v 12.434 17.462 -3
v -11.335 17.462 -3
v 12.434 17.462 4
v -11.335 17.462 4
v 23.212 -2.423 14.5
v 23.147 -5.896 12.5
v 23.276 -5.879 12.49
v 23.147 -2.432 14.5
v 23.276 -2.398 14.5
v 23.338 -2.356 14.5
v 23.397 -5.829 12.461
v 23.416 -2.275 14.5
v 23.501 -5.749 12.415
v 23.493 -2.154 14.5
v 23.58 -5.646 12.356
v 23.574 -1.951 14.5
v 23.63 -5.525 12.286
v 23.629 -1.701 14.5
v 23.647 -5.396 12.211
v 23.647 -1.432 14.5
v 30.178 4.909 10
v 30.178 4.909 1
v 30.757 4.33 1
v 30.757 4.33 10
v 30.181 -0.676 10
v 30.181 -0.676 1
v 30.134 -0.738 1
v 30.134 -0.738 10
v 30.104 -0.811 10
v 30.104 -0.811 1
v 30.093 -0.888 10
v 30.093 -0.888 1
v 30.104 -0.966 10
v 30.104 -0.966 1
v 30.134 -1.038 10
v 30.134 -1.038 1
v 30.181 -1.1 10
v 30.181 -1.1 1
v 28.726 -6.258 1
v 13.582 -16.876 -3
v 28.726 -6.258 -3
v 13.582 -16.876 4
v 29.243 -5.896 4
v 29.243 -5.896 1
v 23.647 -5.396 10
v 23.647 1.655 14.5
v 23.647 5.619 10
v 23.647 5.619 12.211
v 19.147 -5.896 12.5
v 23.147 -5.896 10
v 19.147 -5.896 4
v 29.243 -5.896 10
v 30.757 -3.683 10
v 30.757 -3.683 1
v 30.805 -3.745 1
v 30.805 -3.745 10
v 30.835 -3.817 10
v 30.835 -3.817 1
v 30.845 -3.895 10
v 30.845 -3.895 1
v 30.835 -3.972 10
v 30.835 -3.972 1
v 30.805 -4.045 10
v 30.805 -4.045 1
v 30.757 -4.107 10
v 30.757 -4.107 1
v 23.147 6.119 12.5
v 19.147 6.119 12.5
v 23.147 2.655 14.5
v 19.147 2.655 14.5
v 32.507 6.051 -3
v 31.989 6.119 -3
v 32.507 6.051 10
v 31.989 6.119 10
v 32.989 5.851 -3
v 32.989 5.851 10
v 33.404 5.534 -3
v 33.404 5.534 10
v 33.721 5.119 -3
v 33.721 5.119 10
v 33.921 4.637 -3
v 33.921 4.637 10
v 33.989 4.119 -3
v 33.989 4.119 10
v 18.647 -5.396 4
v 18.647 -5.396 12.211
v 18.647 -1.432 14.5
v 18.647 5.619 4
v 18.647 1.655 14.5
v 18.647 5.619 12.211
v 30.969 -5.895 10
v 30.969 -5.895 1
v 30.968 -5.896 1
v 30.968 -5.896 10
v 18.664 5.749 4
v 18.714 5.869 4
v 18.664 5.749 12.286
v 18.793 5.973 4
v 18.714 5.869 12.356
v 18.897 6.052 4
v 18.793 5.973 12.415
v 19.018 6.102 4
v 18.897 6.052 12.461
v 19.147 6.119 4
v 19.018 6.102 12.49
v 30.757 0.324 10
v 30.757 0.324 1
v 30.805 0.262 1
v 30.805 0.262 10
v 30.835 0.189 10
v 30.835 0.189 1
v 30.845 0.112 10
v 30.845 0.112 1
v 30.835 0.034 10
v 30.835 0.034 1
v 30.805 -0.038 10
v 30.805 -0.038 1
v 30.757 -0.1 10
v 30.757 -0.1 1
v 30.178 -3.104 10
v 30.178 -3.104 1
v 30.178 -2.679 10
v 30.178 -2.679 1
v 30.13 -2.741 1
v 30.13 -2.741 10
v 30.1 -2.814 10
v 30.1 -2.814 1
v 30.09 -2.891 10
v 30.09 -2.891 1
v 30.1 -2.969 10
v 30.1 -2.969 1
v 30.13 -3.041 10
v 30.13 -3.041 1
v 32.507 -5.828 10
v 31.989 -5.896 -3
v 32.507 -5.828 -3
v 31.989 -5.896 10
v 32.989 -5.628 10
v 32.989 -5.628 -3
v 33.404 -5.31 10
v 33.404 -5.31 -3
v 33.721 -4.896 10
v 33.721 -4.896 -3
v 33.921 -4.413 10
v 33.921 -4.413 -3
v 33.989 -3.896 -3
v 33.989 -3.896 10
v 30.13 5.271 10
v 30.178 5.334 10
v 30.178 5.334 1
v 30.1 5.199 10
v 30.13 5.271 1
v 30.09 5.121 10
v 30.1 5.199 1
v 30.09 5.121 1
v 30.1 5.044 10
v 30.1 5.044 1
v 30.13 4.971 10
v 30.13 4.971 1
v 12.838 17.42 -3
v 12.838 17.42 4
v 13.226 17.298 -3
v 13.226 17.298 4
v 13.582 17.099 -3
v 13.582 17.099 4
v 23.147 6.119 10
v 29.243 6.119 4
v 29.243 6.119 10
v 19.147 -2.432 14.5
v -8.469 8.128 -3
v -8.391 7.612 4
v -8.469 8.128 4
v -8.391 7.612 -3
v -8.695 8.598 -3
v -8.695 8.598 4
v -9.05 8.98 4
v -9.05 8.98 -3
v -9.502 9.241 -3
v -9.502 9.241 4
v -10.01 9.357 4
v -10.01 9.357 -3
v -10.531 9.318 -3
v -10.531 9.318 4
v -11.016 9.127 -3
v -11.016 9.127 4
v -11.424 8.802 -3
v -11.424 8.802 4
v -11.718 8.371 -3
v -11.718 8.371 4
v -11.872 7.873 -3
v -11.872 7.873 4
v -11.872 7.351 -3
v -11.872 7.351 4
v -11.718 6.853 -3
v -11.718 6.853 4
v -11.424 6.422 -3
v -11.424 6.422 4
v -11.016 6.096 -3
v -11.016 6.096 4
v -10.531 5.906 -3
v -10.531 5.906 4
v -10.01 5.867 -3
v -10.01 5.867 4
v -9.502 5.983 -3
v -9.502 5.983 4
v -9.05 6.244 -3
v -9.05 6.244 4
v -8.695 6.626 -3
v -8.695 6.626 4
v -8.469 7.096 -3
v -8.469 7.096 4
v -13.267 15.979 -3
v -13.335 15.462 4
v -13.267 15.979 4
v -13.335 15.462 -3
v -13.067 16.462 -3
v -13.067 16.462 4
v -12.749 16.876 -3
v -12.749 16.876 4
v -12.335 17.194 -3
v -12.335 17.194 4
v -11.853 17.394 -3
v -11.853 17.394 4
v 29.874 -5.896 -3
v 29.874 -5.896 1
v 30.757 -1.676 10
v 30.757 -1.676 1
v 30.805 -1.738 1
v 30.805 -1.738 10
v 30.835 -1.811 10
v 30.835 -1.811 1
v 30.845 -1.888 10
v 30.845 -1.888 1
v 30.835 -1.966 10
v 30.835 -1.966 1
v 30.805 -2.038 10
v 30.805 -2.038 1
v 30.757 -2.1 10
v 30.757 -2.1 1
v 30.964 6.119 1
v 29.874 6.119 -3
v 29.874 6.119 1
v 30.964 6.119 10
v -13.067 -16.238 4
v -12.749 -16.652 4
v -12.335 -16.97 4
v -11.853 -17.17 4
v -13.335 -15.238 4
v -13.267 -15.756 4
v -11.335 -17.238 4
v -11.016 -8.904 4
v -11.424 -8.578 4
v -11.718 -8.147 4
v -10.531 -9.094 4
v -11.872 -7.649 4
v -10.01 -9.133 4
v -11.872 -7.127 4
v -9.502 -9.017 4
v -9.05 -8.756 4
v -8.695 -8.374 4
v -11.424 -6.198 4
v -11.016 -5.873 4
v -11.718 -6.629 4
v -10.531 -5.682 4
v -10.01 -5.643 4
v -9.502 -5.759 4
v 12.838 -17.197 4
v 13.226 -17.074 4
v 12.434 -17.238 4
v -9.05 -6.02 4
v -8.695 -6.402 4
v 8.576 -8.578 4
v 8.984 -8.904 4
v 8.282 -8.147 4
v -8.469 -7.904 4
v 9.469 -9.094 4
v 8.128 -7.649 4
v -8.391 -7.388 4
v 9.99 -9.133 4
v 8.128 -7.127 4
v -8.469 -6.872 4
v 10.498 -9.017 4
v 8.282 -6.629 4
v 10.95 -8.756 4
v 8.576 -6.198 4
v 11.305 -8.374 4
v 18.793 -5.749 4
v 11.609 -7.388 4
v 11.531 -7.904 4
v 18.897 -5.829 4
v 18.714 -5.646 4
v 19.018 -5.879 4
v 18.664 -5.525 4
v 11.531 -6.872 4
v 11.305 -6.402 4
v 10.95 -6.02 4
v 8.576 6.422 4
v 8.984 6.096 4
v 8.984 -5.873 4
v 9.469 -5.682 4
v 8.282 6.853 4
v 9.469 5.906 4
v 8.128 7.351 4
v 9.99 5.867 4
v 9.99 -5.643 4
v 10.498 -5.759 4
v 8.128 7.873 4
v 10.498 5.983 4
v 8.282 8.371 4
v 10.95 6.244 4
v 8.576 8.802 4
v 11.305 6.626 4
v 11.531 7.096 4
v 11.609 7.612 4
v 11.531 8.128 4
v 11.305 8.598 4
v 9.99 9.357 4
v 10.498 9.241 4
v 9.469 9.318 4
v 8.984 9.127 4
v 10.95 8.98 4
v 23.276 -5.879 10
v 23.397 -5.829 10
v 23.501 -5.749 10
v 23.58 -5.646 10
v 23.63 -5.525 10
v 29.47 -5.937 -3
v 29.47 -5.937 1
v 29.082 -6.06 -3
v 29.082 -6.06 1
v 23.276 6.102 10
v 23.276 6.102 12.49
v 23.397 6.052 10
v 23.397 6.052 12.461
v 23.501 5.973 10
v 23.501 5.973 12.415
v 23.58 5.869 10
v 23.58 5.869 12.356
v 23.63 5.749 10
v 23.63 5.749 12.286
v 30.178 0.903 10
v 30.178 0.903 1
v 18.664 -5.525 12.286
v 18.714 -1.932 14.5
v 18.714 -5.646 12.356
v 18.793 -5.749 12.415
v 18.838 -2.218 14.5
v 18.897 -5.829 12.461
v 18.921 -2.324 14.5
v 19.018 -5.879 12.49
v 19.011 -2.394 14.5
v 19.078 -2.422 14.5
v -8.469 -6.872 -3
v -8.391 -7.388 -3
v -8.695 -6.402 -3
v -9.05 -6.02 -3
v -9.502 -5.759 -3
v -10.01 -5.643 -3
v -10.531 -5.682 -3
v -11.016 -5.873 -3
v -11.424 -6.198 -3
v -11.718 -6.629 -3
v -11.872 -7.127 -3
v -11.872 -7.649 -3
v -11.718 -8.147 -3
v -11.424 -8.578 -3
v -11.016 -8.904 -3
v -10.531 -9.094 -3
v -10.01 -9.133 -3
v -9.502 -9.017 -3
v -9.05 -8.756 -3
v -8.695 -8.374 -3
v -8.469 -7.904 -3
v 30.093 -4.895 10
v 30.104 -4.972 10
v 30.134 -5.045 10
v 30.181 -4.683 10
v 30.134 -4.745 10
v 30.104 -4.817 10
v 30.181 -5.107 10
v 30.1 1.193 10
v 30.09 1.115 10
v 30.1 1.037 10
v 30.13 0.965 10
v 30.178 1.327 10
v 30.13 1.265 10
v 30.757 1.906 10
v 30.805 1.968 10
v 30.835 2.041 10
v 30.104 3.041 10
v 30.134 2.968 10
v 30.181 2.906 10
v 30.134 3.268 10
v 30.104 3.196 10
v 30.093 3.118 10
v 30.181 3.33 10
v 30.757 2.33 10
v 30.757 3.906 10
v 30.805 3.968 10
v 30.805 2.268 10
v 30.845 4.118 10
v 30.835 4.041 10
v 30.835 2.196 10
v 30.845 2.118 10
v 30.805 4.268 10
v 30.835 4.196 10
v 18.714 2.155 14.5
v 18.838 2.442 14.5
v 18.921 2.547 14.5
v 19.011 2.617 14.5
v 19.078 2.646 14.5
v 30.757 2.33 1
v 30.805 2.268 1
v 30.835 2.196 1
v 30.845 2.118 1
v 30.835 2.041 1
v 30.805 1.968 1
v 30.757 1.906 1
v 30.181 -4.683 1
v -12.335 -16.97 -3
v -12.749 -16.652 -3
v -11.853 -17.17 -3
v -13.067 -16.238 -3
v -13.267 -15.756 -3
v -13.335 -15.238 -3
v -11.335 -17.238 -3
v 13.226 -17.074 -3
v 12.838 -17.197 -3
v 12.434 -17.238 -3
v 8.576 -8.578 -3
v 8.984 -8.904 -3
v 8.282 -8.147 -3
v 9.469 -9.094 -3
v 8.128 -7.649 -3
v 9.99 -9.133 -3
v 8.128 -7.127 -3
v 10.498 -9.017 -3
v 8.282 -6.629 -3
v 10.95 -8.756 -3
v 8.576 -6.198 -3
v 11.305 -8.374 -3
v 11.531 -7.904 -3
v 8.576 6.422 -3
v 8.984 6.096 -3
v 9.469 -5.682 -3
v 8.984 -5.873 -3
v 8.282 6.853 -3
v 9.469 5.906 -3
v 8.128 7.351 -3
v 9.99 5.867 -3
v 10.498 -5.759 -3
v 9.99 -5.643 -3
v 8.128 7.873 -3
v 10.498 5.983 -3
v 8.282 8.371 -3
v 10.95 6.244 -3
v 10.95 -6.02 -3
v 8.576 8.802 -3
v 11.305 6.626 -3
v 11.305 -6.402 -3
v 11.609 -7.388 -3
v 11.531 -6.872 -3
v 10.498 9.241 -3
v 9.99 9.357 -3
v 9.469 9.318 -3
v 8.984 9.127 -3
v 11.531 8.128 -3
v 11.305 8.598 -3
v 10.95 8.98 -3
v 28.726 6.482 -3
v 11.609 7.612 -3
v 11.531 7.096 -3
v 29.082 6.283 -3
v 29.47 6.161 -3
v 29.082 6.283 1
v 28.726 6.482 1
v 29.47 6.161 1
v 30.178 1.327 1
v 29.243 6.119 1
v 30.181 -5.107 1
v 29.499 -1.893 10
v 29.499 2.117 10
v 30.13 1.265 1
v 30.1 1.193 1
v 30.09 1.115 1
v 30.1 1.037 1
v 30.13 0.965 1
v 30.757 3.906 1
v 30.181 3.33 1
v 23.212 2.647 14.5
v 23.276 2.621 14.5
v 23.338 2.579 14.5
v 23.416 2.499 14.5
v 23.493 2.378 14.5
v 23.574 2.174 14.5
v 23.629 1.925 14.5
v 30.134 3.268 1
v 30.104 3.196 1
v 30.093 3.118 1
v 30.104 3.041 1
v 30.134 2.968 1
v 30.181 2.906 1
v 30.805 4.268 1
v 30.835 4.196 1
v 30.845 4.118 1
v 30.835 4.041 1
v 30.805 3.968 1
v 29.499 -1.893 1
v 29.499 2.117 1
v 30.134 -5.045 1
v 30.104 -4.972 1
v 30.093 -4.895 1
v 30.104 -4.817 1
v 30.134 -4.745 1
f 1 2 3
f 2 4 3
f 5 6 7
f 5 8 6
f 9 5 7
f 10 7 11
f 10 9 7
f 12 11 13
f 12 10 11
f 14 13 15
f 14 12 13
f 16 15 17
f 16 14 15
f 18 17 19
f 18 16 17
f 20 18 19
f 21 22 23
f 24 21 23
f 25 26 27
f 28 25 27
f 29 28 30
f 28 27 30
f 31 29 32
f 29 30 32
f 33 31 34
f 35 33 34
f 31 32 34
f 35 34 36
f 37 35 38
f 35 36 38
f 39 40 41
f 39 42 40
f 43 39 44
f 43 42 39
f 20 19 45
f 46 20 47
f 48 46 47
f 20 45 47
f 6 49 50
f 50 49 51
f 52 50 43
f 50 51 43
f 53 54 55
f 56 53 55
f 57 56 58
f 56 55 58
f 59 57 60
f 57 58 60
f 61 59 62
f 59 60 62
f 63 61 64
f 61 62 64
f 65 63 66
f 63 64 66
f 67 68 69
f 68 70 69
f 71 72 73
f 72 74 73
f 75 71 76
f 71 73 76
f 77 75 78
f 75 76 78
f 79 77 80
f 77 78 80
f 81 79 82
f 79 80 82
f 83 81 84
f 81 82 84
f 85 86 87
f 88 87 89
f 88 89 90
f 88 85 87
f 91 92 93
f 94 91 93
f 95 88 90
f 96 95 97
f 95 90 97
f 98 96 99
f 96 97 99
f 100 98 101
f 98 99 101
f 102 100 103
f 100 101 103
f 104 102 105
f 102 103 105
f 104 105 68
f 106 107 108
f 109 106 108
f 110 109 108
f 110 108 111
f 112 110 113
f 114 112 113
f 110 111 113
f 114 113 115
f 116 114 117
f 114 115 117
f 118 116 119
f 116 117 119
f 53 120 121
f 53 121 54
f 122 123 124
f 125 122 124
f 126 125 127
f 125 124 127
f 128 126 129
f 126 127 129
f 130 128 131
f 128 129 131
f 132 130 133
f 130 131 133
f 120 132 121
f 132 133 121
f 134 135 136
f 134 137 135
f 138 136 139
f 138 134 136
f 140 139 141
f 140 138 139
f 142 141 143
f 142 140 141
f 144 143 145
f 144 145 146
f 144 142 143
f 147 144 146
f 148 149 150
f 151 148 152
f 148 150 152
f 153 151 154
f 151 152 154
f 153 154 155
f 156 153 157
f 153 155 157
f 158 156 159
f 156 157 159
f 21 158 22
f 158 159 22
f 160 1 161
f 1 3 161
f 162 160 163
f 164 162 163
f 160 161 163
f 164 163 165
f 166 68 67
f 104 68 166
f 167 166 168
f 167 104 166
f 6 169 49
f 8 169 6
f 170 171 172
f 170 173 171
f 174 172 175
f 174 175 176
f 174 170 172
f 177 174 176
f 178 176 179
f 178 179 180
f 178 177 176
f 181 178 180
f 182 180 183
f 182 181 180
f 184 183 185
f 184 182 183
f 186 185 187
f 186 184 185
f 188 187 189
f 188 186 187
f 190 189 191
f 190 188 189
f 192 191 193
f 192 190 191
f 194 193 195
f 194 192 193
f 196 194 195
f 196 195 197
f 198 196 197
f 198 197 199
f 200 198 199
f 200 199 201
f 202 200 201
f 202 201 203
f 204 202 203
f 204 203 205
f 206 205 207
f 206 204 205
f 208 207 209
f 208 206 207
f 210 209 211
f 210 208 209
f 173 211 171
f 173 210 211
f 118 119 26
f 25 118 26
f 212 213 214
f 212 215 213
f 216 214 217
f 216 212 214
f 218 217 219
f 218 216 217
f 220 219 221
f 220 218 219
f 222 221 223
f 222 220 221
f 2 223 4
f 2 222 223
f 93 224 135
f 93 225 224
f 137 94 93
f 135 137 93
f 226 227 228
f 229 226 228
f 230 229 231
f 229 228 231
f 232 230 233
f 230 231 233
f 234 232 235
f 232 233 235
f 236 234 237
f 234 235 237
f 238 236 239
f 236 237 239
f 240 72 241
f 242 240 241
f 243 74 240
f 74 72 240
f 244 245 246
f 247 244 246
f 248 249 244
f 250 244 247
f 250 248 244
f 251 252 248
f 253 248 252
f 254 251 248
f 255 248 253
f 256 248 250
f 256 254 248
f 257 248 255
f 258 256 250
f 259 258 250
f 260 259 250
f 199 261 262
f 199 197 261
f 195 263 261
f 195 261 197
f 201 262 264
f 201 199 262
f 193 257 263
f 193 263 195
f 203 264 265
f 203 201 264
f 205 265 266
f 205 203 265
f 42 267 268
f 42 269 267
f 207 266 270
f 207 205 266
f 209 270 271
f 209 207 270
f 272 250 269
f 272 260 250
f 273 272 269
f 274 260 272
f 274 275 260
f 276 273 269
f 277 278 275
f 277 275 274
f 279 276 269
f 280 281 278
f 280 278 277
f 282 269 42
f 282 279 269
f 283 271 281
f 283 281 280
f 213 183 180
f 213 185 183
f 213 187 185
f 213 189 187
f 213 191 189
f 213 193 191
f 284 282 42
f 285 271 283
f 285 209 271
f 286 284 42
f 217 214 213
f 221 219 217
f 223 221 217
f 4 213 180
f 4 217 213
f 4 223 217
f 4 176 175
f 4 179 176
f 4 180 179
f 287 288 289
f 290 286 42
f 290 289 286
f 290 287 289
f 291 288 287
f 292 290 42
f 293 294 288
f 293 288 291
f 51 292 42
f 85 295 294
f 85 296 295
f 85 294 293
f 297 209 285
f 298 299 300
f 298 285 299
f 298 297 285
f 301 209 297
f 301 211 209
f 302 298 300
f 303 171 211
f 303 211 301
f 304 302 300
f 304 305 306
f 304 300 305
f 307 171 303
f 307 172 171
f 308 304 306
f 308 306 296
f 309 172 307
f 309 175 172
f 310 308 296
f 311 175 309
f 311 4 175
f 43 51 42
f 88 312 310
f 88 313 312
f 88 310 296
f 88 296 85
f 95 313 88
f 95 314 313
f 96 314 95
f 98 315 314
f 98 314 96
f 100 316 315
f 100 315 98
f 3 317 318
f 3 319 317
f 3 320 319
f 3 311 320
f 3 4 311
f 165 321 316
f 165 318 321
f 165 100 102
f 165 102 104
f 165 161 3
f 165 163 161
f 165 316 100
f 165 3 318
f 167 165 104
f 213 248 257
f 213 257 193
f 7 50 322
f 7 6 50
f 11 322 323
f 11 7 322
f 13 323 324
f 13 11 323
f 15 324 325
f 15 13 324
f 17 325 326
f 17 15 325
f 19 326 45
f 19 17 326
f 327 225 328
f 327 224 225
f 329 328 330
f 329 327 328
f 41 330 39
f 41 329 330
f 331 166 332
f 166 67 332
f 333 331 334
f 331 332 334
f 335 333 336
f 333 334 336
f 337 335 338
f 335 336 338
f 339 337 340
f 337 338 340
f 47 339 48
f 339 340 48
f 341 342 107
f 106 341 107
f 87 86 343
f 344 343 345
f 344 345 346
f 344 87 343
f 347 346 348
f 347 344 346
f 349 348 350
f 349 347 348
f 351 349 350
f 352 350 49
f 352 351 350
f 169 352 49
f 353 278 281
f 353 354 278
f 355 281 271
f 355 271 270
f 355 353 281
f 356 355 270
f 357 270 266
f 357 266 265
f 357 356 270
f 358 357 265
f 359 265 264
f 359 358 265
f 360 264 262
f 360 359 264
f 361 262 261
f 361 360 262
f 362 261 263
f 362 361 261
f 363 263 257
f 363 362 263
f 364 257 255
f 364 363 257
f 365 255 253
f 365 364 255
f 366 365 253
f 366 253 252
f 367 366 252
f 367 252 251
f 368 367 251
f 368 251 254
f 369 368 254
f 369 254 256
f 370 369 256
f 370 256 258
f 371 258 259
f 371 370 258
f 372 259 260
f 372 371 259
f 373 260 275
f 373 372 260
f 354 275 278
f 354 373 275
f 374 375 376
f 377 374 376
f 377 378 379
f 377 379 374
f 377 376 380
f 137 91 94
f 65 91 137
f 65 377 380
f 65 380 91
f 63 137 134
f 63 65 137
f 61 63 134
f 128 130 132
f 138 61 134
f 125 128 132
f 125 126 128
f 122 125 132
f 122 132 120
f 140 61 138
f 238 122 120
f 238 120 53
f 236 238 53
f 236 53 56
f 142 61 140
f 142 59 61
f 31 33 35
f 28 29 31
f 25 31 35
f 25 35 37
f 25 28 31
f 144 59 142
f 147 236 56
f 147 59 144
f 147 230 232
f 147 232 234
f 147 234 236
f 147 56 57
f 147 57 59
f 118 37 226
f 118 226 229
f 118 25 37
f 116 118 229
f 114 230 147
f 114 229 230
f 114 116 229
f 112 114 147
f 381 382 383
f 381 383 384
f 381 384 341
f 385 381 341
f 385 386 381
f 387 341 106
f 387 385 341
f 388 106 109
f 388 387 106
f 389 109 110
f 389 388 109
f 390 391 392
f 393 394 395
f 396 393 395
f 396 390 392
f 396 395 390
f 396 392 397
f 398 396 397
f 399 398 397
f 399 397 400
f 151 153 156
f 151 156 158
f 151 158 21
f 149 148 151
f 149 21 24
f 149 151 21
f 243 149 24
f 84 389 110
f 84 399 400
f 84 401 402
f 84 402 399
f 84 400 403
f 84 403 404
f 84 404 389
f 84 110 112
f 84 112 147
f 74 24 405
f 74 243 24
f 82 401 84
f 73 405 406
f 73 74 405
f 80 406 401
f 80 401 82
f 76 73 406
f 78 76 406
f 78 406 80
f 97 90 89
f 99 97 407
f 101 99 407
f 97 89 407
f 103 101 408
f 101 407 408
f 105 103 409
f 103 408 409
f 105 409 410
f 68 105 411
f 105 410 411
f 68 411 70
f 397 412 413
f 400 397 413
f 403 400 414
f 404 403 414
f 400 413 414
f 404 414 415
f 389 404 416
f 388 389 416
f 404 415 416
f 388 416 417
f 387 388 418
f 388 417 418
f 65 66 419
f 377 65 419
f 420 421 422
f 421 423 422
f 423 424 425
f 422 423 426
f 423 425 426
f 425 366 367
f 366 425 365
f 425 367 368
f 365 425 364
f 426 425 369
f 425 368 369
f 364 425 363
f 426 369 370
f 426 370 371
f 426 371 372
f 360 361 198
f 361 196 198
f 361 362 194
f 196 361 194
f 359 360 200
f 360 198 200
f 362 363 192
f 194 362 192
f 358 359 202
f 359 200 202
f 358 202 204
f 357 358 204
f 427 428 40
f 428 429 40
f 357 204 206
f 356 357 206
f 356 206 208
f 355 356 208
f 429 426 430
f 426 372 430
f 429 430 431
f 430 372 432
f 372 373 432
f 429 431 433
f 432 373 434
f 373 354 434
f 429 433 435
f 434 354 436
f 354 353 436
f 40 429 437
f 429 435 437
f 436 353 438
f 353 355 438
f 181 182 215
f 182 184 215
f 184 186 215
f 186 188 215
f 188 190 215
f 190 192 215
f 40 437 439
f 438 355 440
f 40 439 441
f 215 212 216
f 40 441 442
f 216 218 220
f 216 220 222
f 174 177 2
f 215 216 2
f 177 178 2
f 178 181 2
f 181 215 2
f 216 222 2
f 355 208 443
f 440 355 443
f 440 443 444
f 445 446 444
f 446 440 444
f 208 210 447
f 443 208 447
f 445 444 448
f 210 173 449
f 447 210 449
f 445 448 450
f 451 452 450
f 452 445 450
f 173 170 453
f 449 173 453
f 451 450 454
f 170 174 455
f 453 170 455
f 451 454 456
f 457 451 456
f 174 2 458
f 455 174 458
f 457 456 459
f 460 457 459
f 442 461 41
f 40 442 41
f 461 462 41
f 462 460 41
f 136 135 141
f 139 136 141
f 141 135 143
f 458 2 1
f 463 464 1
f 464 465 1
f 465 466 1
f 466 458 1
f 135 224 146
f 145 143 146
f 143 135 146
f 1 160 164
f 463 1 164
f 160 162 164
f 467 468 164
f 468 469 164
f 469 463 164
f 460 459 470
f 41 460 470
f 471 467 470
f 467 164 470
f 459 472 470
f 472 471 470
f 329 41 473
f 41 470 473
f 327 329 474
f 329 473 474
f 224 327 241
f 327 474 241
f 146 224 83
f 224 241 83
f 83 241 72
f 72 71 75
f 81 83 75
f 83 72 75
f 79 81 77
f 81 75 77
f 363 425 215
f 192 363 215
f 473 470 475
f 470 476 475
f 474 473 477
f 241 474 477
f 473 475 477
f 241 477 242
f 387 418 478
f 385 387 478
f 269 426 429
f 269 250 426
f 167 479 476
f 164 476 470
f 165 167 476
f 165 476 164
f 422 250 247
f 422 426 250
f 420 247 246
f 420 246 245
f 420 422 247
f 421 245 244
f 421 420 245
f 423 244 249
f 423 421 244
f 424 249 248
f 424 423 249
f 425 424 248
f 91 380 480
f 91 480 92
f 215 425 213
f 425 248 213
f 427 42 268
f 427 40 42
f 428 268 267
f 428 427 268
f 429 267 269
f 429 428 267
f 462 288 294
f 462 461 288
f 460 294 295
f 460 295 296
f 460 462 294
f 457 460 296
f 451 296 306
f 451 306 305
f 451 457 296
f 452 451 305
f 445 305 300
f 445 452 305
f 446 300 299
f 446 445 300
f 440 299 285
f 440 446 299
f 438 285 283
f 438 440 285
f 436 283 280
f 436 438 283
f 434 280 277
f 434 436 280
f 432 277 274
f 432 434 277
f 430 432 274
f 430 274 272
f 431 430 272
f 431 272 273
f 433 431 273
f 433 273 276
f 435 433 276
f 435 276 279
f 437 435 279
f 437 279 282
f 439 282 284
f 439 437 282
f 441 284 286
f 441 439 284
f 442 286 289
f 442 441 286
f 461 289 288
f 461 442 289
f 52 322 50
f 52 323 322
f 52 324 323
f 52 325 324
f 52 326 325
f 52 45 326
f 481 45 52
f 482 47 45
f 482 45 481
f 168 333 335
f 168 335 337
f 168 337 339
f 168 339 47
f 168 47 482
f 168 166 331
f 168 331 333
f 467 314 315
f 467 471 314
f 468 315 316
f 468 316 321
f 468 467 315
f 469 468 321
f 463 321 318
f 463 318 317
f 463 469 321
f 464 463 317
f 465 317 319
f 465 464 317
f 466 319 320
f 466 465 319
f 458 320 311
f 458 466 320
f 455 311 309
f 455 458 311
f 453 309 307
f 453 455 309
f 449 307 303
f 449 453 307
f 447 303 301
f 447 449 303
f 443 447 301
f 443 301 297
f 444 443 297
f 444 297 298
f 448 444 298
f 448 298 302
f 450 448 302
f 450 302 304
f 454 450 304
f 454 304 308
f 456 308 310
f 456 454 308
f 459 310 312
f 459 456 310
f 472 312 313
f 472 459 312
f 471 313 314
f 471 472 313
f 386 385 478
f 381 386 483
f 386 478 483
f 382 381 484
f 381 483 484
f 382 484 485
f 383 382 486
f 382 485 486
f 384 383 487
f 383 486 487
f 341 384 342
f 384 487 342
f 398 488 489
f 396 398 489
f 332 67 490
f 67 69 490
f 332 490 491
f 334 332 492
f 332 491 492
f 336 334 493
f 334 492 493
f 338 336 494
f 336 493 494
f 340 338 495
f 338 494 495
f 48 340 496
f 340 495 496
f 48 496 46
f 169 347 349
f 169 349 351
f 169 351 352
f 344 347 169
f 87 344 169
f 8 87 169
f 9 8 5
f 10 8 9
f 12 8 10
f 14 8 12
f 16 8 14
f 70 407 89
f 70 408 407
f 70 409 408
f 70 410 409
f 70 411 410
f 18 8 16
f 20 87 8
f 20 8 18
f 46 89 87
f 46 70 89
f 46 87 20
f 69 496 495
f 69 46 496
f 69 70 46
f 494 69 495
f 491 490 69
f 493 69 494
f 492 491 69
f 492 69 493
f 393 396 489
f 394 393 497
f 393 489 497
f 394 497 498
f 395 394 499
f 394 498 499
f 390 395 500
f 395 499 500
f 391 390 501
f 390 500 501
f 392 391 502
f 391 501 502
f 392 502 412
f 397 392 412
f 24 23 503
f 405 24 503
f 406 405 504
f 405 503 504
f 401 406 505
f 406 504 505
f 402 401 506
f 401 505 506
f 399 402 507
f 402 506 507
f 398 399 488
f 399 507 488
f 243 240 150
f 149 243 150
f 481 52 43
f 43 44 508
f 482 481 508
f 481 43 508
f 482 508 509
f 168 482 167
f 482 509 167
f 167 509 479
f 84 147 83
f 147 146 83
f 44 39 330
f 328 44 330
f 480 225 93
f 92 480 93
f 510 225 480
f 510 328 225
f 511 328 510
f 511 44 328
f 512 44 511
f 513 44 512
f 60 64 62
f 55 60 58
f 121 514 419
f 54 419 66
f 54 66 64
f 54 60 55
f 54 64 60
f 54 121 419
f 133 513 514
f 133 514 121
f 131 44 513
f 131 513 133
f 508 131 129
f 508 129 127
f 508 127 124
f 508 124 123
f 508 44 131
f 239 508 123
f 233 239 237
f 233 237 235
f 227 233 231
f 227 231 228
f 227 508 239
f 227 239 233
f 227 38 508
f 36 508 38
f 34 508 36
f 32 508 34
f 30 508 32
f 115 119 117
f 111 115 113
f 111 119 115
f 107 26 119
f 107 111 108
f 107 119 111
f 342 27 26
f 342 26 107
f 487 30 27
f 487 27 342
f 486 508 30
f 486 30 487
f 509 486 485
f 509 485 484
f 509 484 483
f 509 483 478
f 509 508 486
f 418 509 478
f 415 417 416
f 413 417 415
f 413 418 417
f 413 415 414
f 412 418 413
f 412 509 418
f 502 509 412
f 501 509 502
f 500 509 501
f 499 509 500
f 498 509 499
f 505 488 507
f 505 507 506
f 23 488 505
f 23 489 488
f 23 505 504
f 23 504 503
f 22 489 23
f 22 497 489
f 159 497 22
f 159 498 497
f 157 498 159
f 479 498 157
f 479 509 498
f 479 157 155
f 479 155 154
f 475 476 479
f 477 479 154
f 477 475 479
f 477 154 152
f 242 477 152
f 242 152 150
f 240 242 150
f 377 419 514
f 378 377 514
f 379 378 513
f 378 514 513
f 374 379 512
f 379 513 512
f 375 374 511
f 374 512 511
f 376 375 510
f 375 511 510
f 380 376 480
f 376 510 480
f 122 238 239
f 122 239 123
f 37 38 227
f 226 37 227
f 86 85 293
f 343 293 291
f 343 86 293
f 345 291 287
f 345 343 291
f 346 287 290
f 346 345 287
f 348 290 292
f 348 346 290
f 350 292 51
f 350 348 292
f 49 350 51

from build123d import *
from OCP.BRepFilletAPI import BRepFilletAPI_MakeChamfer

# Parameters (mm, degrees)
EXTRUDE_1_DEPTH        = 4
EXTRUDE_1_DEPTH_BACK   = 3
SKETCH_1_R             = 1.75
EXTRUDE_1_2_DEPTH      = 4
EXTRUDE_1_2_DEPTH_BACK = 3
EXTRUDE_START          = 4
EXTRUDE_2_DEPTH        = 6
EXTRUDE_3_DEPTH        = 1
EXTRUDE_3_DEPTH_BACK   = 3
FILLET_1_R             = 2
SKETCH_2_W             = 5
SKETCH_2_H             = 12.015250562
EXTRUDE_4_DEPTH        = 10.5
CHAMFER_2_SIZE         = 2
CHAMFER_2_SIZE2        = 3.464101615
FILLET_2_R             = 0.5


with BuildPart() as part:
    # Эскиз1 → Бобышка-Вытянуть1 (new, two sides: drawn at the far end of the back side and taken through both)
    with BuildSketch(Plane.XY.offset(-EXTRUDE_1_DEPTH_BACK)):
        with BuildLine():
            Line((-13.335192836, 17.461834668), (-13.335192836, -17.238165332))
            Line((-13.335192836, -17.238165332), (13.064807164, -17.238165332))
            Line((13.064807164, -17.238165332), (29.24315013, -5.895849196))
            ThreePointArc((29.24315013, -5.895849196), (29.53124223, 0.111776085), (29.24315013, 6.119401366))
            Line((29.24315013, 6.119401366), (13.064807164, 17.461834668))
            Line((13.064807164, 17.461834668), (-13.335192836, 17.461834668))
        make_face()
        with Locations((-10.14124139, -7.388165332)):
            Circle(SKETCH_1_R, mode=Mode.SUBTRACT)
        with Locations((9.85875861, -7.388165332)):
            Circle(SKETCH_1_R, mode=Mode.SUBTRACT)
        with Locations((-10.14124139, 7.611834668)):
            Circle(SKETCH_1_R, mode=Mode.SUBTRACT)
        with Locations((9.85875861, 7.611834668)):
            Circle(SKETCH_1_R, mode=Mode.SUBTRACT)
    extrude(amount=EXTRUDE_1_DEPTH + EXTRUDE_1_DEPTH_BACK)



with BuildPart() as body_2:
    # Эскиз1 → Extrude 1 2 (new, two sides: drawn at the far end of the back side and taken through both)
    with BuildSketch(Plane.XY.offset(-EXTRUDE_1_2_DEPTH_BACK)):
        with BuildLine():
            Line((30.969143909, -5.894657137), (30.967951851, -5.895849196))
            Line((30.967951851, -5.895849196), (33.989360696, -5.895849196))
            Line((33.989360696, -5.895849196), (33.989360696, 6.119401366))
            Line((33.989360696, 6.119401366), (30.963902746, 6.119401366))
            Line((30.963902746, 6.119401366), (30.178059332, 5.333557953))
            ThreePointArc((30.178059332, 5.333557953), (30.090191367, 5.121425918), (30.178059332, 4.909293884))
            Line((30.178059332, 4.909293884), (30.757011875, 4.330341341))
            ThreePointArc((30.757011875, 4.330341341), (30.84487984, 4.118209307), (30.757011875, 3.906077273))
            Line((30.757011875, 3.906077273), (30.181275944, 3.330341341))
            ThreePointArc((30.181275944, 3.330341341), (30.093407978, 3.118209307), (30.181275944, 2.906077273))
            Line((30.181275944, 2.906077273), (30.757011875, 2.330341341))
            ThreePointArc((30.757011875, 2.330341341), (30.84487984, 2.118209307), (30.757011875, 1.906077273))
            Line((30.757011875, 1.906077273), (30.178059332, 1.32712473))
            ThreePointArc((30.178059332, 1.32712473), (30.090191367, 1.114992696), (30.178059332, 0.902860662))
            Line((30.178059332, 0.902860662), (30.757011875, 0.323908119))
            ThreePointArc((30.757011875, 0.323908119), (30.84487984, 0.111776085), (30.757011875, -0.10035595))
            Line((30.757011875, -0.10035595), (30.181275944, -0.676091881))
            ThreePointArc((30.181275944, -0.676091881), (30.093407978, -0.888223915), (30.181275944, -1.10035595))
            Line((30.181275944, -1.10035595), (30.757011875, -1.676091881))
            ThreePointArc((30.757011875, -1.676091881), (30.84487984, -1.888223915), (30.757011875, -2.10035595))
            Line((30.757011875, -2.10035595), (30.178059332, -2.679308492))
            ThreePointArc((30.178059332, -2.679308492), (30.090191367, -2.891440526), (30.178059332, -3.103572561))
            Line((30.178059332, -3.103572561), (30.757011875, -3.682525103))
            ThreePointArc((30.757011875, -3.682525103), (30.84487984, -3.894657137), (30.757011875, -4.106789172))
            Line((30.757011875, -4.106789172), (30.181275944, -4.682525103))
            ThreePointArc((30.181275944, -4.682525103), (30.093407978, -4.894657137), (30.181275944, -5.106789172))
            Line((30.181275944, -5.106789172), (30.969143909, -5.894657137))
        make_face()
    extrude(amount=EXTRUDE_1_2_DEPTH + EXTRUDE_1_2_DEPTH_BACK)


with BuildPart() as part_1:
    add(part.part)

    add(body_2.part)  # Бобышка-Вытянуть2 merges body 2
    # Эскиз1<3> → Бобышка-Вытянуть2 (add)
    with BuildSketch(Plane.XY.offset(EXTRUDE_START)):
        with BuildLine():
            Line((21.86916953, -5.895849196), (29.24315013, -5.895849196))
            ThreePointArc((29.24315013, -5.895849196), (29.53124223, 0.111776085), (29.24315013, 6.119401366))
            Line((29.24315013, 6.119401366), (21.86916953, 6.119401366))
            Line((21.86916953, 6.119401366), (21.86916953, -5.895849196))
        make_face()
        with BuildLine():
            Line((30.969143909, -5.894657137), (30.967951851, -5.895849196))
            Line((30.967951851, -5.895849196), (33.989360696, -5.895849196))
            Line((33.989360696, -5.895849196), (33.989360696, 6.119401366))
            Line((33.989360696, 6.119401366), (30.963902746, 6.119401366))
            Line((30.963902746, 6.119401366), (30.178059332, 5.333557953))
            ThreePointArc((30.178059332, 5.333557953), (30.090191367, 5.121425918), (30.178059332, 4.909293884))
            Line((30.178059332, 4.909293884), (30.757011875, 4.330341341))
            ThreePointArc((30.757011875, 4.330341341), (30.84487984, 4.118209307), (30.757011875, 3.906077273))
            Line((30.757011875, 3.906077273), (30.181275944, 3.330341341))
            ThreePointArc((30.181275944, 3.330341341), (30.093407978, 3.118209307), (30.181275944, 2.906077273))
            Line((30.181275944, 2.906077273), (30.757011875, 2.330341341))
            ThreePointArc((30.757011875, 2.330341341), (30.84487984, 2.118209307), (30.757011875, 1.906077273))
            Line((30.757011875, 1.906077273), (30.178059332, 1.32712473))
            ThreePointArc((30.178059332, 1.32712473), (30.090191367, 1.114992696), (30.178059332, 0.902860662))
            Line((30.178059332, 0.902860662), (30.757011875, 0.323908119))
            ThreePointArc((30.757011875, 0.323908119), (30.84487984, 0.111776085), (30.757011875, -0.10035595))
            Line((30.757011875, -0.10035595), (30.181275944, -0.676091881))
            ThreePointArc((30.181275944, -0.676091881), (30.093407978, -0.888223915), (30.181275944, -1.10035595))
            Line((30.181275944, -1.10035595), (30.757011875, -1.676091881))
            ThreePointArc((30.757011875, -1.676091881), (30.84487984, -1.888223915), (30.757011875, -2.10035595))
            Line((30.757011875, -2.10035595), (30.178059332, -2.679308492))
            ThreePointArc((30.178059332, -2.679308492), (30.090191367, -2.891440526), (30.178059332, -3.103572561))
            Line((30.178059332, -3.103572561), (30.757011875, -3.682525103))
            ThreePointArc((30.757011875, -3.682525103), (30.84487984, -3.894657137), (30.757011875, -4.106789172))
            Line((30.757011875, -4.106789172), (30.181275944, -4.682525103))
            ThreePointArc((30.181275944, -4.682525103), (30.093407978, -4.894657137), (30.181275944, -5.106789172))
            Line((30.181275944, -5.106789172), (30.969143909, -5.894657137))
        make_face()
    extrude(amount=EXTRUDE_2_DEPTH)

    # Эскиз1<4> → Бобышка-Вытянуть3 (add, two sides: drawn at the far end of the back side and taken through both)
    with BuildSketch(Plane.XY.offset(-EXTRUDE_3_DEPTH_BACK)):
        with BuildLine():
            ThreePointArc((29.24315013, 6.119401366), (29.53124223, 0.111776085), (29.24315013, -5.895849196))
            Line((29.24315013, -5.895849196), (30.967951851, -5.895849196))
            Line((30.967951851, -5.895849196), (30.969143909, -5.894657137))
            Line((30.969143909, -5.894657137), (30.181275944, -5.106789172))
            ThreePointArc((30.181275944, -5.106789172), (30.093407978, -4.894657137), (30.181275944, -4.682525103))
            Line((30.181275944, -4.682525103), (30.757011875, -4.106789172))
            ThreePointArc((30.757011875, -4.106789172), (30.84487984, -3.894657137), (30.757011875, -3.682525103))
            Line((30.757011875, -3.682525103), (30.178059332, -3.103572561))
            ThreePointArc((30.178059332, -3.103572561), (30.090191367, -2.891440526), (30.178059332, -2.679308492))
            Line((30.178059332, -2.679308492), (30.757011875, -2.10035595))
            ThreePointArc((30.757011875, -2.10035595), (30.84487984, -1.888223915), (30.757011875, -1.676091881))
            Line((30.757011875, -1.676091881), (30.181275944, -1.10035595))
            ThreePointArc((30.181275944, -1.10035595), (30.093407978, -0.888223915), (30.181275944, -0.676091881))
            Line((30.181275944, -0.676091881), (30.757011875, -0.10035595))
            ThreePointArc((30.757011875, -0.10035595), (30.84487984, 0.111776085), (30.757011875, 0.323908119))
            Line((30.757011875, 0.323908119), (30.178059332, 0.902860662))
            ThreePointArc((30.178059332, 0.902860662), (30.090191367, 1.114992696), (30.178059332, 1.32712473))
            Line((30.178059332, 1.32712473), (30.757011875, 1.906077273))
            ThreePointArc((30.757011875, 1.906077273), (30.84487984, 2.118209307), (30.757011875, 2.330341341))
            Line((30.757011875, 2.330341341), (30.181275944, 2.906077273))
            ThreePointArc((30.181275944, 2.906077273), (30.093407978, 3.118209307), (30.181275944, 3.330341341))
            Line((30.181275944, 3.330341341), (30.757011875, 3.906077273))
            ThreePointArc((30.757011875, 3.906077273), (30.84487984, 4.118209307), (30.757011875, 4.330341341))
            Line((30.757011875, 4.330341341), (30.178059332, 4.909293884))
            ThreePointArc((30.178059332, 4.909293884), (30.090191367, 5.121425918), (30.178059332, 5.333557953))
            Line((30.178059332, 5.333557953), (30.963902746, 6.119401366))
            Line((30.963902746, 6.119401366), (29.24315013, 6.119401366))
        make_face()
    extrude(amount=EXTRUDE_3_DEPTH + EXTRUDE_3_DEPTH_BACK)

    # Скругление1
    fillet_1_edges = [part_1.edges().sort_by_distance(p)[0] for p in [
        (13.064807164, 17.461834668, 0.5),
        (13.064807164, -17.238165332, 0.5),
        (-13.335192836, -17.238165332, 0.5),
        (-13.335192836, 17.461834668, 0.5),
        (33.989360696, -5.895849196, 3.5),
        (33.989360696, 6.119401366, 3.5),
        (29.24315013, -5.895849196, -1),
        (29.24315013, 6.119401366, -1),
    ]]
    fillet(fillet_1_edges, radius=FILLET_1_R)

    # Эскиз2 → Бобышка-Вытянуть4 (add)
    with BuildSketch(Plane.XY.offset(4)):
        with Locations((21.146996963, 0.111776085)):
            Rectangle(SKETCH_2_W, SKETCH_2_H)
    extrude(amount=EXTRUDE_4_DEPTH)

    # Фаска2: one chamfer whose edges measure the first distance from different faces: ONE call of the kernel's chamfer builder (chamfer() names one face for all edges)
    chamfer_2_edges_1 = [part_1.edges().sort_by_distance(p)[0] for p in [
        (21.146996963, -5.895849196, 14.5),
    ]]
    chamfer_2_side_1 = [part_1.faces().sort_by_distance(p)[0] for p in [
        (23.213672797, -5.895849196, 8.3723191),
    ]]
    chamfer_2_edges_2 = [part_1.edges().sort_by_distance(p)[0] for p in [
        (21.146996963, 6.119401366, 14.5),
    ]]
    chamfer_2_side_2 = [part_1.faces().sort_by_distance(p)[0] for p in [
        (23.213672797, 6.119401366, 8.3723191),
    ]]
    chamfer_2 = BRepFilletAPI_MakeChamfer(part_1.part.solid().wrapped)
    for e in chamfer_2_edges_1:
        chamfer_2.Add(CHAMFER_2_SIZE, CHAMFER_2_SIZE2, e.wrapped, chamfer_2_side_1[0].wrapped)  # the first distance lies on this face
    for e in chamfer_2_edges_2:
        chamfer_2.Add(CHAMFER_2_SIZE, CHAMFER_2_SIZE2, e.wrapped, chamfer_2_side_2[0].wrapped)  # the first distance lies on this face
    add(Compound.cast(chamfer_2.Shape()), mode=Mode.REPLACE)

    # Скругление2
    fillet_2_edges = [part_1.edges().sort_by_distance(p)[0] for p in [
        (23.646996963, -5.895849196, 11.25),
        (23.646996963, 6.119401366, 11.25),
        (18.646996963, -5.895849196, 8.25),
        (18.646996963, -4.163798388, 13.5),
        (18.646996963, 4.387350558, 13.5),
        (18.646996963, 6.119401366, 8.25),
        (23.646996963, 4.387350558, 13.5),
        (23.646996963, -4.163798388, 13.5),
    ]]
    fillet(fillet_2_edges, radius=FILLET_2_R)


solid = part_1.part
